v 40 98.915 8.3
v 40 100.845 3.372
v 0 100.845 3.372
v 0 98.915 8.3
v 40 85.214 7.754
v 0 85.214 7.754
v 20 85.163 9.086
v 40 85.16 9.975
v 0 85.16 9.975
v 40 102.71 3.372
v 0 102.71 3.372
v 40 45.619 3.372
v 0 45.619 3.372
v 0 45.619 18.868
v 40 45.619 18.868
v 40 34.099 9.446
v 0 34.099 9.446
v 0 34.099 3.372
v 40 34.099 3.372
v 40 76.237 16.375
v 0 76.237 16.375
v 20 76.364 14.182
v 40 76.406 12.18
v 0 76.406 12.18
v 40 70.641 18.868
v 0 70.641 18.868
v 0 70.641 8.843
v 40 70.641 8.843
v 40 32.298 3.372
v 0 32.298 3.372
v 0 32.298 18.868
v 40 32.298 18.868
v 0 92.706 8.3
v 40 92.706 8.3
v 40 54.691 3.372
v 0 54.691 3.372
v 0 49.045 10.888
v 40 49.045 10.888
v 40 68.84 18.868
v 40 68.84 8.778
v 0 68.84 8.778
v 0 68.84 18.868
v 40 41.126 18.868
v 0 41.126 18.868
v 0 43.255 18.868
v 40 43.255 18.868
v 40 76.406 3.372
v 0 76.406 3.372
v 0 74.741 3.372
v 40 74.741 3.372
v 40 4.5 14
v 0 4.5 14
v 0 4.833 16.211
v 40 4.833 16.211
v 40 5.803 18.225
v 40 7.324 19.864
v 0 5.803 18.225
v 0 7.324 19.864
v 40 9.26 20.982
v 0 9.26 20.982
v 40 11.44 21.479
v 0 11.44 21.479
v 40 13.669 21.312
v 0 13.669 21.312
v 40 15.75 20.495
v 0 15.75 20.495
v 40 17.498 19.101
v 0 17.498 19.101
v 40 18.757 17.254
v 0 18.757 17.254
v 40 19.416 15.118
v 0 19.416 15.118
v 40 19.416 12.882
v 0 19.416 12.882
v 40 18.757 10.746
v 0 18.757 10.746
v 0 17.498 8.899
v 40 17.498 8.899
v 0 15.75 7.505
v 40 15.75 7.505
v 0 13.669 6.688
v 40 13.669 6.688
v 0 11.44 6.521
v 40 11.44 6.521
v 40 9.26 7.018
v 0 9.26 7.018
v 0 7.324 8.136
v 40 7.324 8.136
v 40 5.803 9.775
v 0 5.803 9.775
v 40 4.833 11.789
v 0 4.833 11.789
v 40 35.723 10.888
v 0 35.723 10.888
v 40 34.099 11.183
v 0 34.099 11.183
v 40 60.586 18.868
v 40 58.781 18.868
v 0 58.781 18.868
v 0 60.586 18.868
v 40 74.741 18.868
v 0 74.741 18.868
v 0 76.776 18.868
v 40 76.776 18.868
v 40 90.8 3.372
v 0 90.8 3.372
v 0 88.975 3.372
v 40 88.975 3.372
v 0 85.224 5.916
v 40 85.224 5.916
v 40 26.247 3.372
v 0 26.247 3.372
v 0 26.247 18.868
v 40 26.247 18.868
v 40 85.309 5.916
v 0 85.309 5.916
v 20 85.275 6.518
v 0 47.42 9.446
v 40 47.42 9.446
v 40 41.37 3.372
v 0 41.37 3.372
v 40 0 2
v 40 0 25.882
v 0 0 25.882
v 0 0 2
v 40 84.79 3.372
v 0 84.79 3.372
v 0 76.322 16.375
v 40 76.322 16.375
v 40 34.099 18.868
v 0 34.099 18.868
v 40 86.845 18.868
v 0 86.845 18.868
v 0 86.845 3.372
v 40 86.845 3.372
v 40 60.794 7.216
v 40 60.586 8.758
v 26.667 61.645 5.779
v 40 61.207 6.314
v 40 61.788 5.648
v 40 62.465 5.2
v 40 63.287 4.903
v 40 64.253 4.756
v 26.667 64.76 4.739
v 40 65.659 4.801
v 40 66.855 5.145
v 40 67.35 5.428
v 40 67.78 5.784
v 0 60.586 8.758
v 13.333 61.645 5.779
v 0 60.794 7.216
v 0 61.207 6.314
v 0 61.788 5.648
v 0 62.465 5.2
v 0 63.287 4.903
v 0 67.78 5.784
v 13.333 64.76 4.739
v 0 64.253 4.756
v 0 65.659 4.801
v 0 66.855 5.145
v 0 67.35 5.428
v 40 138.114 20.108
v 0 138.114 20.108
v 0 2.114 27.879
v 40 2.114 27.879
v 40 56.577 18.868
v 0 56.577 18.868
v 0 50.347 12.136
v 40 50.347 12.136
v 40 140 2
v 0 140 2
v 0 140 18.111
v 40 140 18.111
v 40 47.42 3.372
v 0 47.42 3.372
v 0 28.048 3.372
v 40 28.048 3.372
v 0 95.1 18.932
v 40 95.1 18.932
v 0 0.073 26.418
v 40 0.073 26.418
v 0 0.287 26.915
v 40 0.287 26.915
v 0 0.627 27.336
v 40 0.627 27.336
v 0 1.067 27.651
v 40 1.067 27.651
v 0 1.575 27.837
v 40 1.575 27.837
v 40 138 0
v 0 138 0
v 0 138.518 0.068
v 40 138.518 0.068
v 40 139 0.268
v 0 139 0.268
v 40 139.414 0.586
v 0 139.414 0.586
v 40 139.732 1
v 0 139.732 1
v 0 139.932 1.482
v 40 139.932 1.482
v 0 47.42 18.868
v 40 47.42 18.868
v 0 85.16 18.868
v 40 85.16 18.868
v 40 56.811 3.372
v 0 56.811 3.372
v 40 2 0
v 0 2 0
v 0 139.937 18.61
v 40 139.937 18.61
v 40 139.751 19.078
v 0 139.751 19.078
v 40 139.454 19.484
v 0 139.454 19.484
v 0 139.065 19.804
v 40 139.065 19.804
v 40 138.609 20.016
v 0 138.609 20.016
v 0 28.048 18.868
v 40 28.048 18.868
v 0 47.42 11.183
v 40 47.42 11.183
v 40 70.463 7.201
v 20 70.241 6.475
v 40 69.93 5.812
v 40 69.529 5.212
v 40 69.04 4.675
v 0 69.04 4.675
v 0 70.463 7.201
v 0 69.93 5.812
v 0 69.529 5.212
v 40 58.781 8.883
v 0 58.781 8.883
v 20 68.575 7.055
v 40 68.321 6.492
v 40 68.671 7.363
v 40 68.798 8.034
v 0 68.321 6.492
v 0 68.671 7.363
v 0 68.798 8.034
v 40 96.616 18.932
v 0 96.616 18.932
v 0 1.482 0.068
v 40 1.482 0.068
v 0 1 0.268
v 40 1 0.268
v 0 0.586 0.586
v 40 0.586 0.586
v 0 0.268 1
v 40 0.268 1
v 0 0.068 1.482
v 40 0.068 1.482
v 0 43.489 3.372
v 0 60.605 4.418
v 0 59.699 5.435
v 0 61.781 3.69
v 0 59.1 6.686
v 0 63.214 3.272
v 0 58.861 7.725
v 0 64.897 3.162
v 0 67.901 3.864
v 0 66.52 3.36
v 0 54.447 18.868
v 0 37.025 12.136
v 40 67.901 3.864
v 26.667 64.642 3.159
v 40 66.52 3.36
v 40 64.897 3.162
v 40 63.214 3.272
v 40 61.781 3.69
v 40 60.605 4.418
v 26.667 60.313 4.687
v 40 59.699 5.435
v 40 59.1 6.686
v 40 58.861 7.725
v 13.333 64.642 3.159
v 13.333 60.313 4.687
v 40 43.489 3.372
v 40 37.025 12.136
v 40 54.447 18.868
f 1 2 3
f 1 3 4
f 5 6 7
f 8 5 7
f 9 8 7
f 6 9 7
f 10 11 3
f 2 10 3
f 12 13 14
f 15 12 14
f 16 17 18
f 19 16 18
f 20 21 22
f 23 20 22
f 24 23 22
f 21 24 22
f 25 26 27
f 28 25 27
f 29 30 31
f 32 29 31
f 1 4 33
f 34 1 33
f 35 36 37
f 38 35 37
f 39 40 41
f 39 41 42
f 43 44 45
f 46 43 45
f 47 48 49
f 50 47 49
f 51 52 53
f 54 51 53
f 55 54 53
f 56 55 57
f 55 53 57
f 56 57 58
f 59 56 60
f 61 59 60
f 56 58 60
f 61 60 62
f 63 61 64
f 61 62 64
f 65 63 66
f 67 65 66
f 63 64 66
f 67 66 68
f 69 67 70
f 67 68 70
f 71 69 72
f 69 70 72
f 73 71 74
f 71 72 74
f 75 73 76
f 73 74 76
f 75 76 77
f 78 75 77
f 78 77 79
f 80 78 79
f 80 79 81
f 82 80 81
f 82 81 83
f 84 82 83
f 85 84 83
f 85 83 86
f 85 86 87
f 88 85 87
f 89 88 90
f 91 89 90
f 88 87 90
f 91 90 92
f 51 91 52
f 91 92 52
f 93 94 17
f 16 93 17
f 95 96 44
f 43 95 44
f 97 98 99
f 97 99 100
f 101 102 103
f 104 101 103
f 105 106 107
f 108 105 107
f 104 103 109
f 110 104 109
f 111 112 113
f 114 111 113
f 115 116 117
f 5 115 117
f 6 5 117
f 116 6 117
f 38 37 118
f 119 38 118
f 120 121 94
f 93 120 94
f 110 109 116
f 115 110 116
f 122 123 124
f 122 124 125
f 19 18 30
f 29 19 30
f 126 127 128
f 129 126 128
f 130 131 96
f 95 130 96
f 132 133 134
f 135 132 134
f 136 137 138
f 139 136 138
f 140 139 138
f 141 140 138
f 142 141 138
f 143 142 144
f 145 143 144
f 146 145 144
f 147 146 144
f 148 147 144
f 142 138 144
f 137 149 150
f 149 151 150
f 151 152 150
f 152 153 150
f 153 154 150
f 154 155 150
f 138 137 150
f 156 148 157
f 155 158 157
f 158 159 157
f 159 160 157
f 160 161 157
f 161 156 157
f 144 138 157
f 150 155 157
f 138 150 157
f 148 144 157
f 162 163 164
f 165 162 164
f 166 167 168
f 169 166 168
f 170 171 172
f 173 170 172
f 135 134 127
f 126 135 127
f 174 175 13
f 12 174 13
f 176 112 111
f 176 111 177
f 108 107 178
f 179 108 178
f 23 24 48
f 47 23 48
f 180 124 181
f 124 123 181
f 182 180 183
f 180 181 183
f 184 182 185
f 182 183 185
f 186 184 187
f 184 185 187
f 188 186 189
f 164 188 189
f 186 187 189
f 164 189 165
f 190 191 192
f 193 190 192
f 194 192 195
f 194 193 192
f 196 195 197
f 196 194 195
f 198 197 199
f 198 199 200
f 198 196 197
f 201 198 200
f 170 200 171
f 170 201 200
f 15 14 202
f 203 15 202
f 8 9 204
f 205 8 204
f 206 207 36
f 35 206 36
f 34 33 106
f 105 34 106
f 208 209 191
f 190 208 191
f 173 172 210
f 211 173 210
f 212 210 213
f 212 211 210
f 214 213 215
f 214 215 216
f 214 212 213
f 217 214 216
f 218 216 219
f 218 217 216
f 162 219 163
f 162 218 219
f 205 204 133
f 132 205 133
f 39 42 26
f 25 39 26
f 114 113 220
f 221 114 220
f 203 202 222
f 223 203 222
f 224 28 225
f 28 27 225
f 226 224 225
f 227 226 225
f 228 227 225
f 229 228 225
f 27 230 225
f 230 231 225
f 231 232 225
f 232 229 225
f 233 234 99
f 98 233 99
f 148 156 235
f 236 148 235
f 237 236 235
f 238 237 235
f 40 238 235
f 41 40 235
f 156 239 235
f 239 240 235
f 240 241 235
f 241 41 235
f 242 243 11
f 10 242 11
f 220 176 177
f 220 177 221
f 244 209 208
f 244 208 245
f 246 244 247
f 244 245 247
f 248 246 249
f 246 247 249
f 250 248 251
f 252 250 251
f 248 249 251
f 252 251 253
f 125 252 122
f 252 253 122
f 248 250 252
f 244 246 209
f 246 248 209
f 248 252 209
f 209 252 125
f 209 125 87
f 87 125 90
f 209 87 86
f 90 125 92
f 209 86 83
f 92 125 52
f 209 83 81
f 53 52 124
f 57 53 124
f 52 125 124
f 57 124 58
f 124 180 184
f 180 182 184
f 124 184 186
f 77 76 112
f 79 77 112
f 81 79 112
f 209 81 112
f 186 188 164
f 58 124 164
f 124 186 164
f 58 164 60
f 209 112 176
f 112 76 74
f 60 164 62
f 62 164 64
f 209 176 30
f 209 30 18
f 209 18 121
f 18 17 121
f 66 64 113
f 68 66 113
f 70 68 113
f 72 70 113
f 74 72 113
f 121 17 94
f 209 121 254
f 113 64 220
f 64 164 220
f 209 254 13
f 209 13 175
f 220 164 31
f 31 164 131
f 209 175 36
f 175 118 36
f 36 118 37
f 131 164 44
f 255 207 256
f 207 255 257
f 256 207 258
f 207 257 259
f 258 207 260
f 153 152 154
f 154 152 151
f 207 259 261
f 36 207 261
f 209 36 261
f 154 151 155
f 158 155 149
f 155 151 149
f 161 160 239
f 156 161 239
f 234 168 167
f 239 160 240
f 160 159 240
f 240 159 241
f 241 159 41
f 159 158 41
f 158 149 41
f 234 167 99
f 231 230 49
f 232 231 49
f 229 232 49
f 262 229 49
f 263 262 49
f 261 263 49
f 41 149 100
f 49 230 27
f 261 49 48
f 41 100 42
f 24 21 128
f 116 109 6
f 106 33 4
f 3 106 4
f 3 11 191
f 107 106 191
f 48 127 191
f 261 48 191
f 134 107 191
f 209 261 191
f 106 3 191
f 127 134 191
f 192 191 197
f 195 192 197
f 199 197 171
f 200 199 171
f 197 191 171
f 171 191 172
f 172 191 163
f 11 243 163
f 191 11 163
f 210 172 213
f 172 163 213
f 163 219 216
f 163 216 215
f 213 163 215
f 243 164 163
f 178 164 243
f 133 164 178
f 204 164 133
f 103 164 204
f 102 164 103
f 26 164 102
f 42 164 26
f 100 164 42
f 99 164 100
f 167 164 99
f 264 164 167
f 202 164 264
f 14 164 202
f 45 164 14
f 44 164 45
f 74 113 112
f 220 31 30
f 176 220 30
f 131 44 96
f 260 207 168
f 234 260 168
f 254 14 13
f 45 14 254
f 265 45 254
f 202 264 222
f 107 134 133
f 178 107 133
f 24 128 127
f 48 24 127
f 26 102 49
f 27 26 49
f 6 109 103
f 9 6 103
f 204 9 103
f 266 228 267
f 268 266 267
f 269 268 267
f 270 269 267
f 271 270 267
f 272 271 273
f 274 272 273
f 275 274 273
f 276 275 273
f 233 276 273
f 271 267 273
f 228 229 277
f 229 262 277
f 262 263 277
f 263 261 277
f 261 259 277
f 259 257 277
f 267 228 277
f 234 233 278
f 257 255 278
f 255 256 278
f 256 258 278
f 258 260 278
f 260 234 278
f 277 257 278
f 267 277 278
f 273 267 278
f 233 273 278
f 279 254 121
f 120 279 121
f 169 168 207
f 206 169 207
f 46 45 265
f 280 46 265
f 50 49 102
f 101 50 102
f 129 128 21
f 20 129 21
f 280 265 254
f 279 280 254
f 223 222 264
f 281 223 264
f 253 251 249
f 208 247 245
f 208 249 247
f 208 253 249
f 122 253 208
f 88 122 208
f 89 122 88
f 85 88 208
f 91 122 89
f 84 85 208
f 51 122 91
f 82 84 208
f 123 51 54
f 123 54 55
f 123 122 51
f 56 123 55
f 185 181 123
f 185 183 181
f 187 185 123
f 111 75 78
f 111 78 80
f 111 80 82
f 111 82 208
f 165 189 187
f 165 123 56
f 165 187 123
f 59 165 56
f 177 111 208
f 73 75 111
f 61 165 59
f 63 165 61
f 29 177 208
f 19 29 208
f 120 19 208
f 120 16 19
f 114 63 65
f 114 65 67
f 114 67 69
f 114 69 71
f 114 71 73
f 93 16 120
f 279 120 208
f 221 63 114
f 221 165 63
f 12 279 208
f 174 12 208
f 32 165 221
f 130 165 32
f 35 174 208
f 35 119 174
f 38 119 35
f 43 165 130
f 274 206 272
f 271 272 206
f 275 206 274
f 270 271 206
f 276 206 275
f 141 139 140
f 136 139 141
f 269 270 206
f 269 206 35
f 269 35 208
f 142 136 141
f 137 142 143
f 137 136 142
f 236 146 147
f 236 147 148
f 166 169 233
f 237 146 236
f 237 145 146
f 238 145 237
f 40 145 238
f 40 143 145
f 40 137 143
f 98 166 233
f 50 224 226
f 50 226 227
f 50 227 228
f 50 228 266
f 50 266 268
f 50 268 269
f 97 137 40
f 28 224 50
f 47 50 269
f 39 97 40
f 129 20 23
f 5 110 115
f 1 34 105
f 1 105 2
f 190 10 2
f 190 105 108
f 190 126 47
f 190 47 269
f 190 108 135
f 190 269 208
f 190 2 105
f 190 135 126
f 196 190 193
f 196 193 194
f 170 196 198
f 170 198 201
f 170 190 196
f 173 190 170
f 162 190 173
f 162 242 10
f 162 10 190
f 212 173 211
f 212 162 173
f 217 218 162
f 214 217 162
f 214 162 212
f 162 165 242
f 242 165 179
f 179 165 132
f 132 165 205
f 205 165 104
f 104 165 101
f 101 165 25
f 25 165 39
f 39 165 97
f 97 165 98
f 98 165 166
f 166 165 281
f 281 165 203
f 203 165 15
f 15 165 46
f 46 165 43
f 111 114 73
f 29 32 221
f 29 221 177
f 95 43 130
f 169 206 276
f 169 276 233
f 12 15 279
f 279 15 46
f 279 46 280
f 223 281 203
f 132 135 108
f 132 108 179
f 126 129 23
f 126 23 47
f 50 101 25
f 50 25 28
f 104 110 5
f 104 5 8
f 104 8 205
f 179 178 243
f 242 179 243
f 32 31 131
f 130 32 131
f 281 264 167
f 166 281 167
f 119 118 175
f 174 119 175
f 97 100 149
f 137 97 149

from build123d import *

# Parameters (mm, degrees)
F0_W     = 1.8008393743
F0_H     = 15.4953580059
F1_DEPTH = 40
F2_R     = 2


with BuildPart() as f1:
    # F0 (on Right) → F1 (new body)
    with BuildSketch(Plane.YZ):
        Polygon((0, 14), (0, 0), (140, 0), (140, 20), (0, 28), align=None)
        with Locations((27.1479118072, 11.1200559583)):
            Rectangle(F0_W, F0_H, mode=Mode.SUBTRACT)
        Polygon((37.0253970758, 12.135783628), (43.4894269202, 3.3723769554), (41.3697948883, 3.3723769554), (35.7230951554, 10.8877442876), (34.0986091661, 9.4463945059), (34.0986091661, 3.3723769554), (32.2977697919, 3.3723769554), (32.2977697919, 18.8677349612), (34.0986091661, 18.8677349612), (34.0986091661, 11.1827970664), (41.1256132782, 18.8677349612), (43.2554195439, 18.8677349612), align=None, mode=Mode.SUBTRACT)
        Polygon((50.3468604697, 12.135783628), (56.8108903141, 3.3723769554), (54.6912582823, 3.3723769554), (49.0445585493, 10.8877442876), (47.4200725601, 9.4463945059), (47.4200725601, 3.3723769554), (45.6192331858, 3.3723769554), (45.6192331858, 18.8677349612), (47.4200725601, 18.8677349612), (47.4200725601, 11.1827970664), (54.4470766722, 18.8677349612), (56.5768829378, 18.8677349612), align=None, mode=Mode.SUBTRACT)
        with BuildLine():
            Line((68.8402260215, 18.8677349612), (70.6410653957, 18.8677349612))
            Line((70.6410653957, 18.8677349612), (70.6410653957, 8.8427233032))
            add(Edge.make_bspline(
                [(70.6410653957, 8.8427233032), (70.6410653957, 6.1906397049), (69.0403192853, 4.6746788757)],
                knots=[0, 0, 0, 1, 1, 1], degree=2))
            add(Edge.make_bspline(
                [(69.0403192853, 4.6746788757), (67.4395731748, 3.1587180465), (64.6416588927, 3.1587180465)],
                knots=[0, 0, 0, 1, 1, 1], degree=2))
            add(Edge.make_bspline(
                [(64.6416588927, 3.1587180465), (61.8437446106, 3.1587180465), (60.3125224308, 4.6865488151)],
                knots=[0, 0, 0, 1, 1, 1], degree=2))
            add(Edge.make_bspline(
                [(60.3125224308, 4.6865488151), (58.781300251, 6.2143795837), (58.781300251, 8.8834202382)],
                knots=[0, 0, 0, 1, 1, 1], degree=2))
            Line((58.781300251, 8.8834202382), (58.781300251, 18.8677349612))
            Line((58.781300251, 18.8677349612), (60.5855310365, 18.8677349612))
            Line((60.5855310365, 18.8677349612), (60.5855310365, 8.757938022))
            add(Edge.make_bspline(
                [(60.5855310365, 8.757938022), (60.5855310365, 6.8180507864), (61.6453470525, 5.7785832379)],
                knots=[0, 0, 0, 1, 1, 1], degree=2))
            add(Edge.make_bspline(
                [(61.6453470525, 5.7785832379), (62.7051630684, 4.7391156895), (64.7603582865, 4.7391156895)],
                knots=[0, 0, 0, 1, 1, 1], degree=2))
            add(Edge.make_bspline(
                [(64.7603582865, 4.7391156895), (66.7205939896, 4.7391156895), (67.7804100055, 5.7836703548)],
                knots=[0, 0, 0, 1, 1, 1], degree=2))
            add(Edge.make_bspline(
                [(67.7804100055, 5.7836703548), (68.8402260215, 6.8282250201), (68.8402260215, 8.7782864895)],
                knots=[0, 0, 0, 1, 1, 1], degree=2))
            Line((68.8402260215, 8.7782864895), (68.8402260215, 18.8677349612))
        make_face(mode=Mode.SUBTRACT)
        with BuildLine():
            Line((86.8452283531, 18.8677349612), (86.8452283531, 3.3723769554))
            Line((86.8452283531, 3.3723769554), (84.7900331349, 3.3723769554))
            Line((84.7900331349, 3.3723769554), (76.3216792412, 16.3750476917))
            Line((76.3216792412, 16.3750476917), (76.2368939599, 16.3750476917))
            add(Edge.make_bspline(
                [(76.2368939599, 16.3750476917), (76.4064645225, 14.0858450973), (76.4064645225, 12.1798719742)],
                knots=[0, 0, 0, 1, 1, 1], degree=2))
            Line((76.4064645225, 12.1798719742), (76.4064645225, 3.3723769554))
            Line((76.4064645225, 3.3723769554), (74.7412815982, 3.3723769554))
            Line((74.7412815982, 3.3723769554), (74.7412815982, 18.8677349612))
            Line((74.7412815982, 18.8677349612), (76.7761283488, 18.8677349612))
            Line((76.7761283488, 18.8677349612), (85.2241337751, 5.9159353936))
            Line((85.2241337751, 5.9159353936), (85.3089190564, 5.9159353936))
            add(Edge.make_bspline(
                [(85.3089190564, 5.9159353936), (85.2885705888, 6.2008139387), (85.2139595413, 7.7540802917)],
                knots=[0, 0, 0, 1, 1, 1], degree=2))
            add(Edge.make_bspline(
                [(85.2139595413, 7.7540802917), (85.1393484938, 9.3073466446), (85.1596969613, 9.9754546611)],
                knots=[0, 0, 0, 1, 1, 1], degree=2))
            Line((85.1596969613, 9.9754546611), (85.1596969613, 18.8677349612))
            Line((85.1596969613, 18.8677349612), (86.8452283531, 18.8677349612))
        make_face(mode=Mode.SUBTRACT)
        Polygon((102.7102501853, 3.3723769554), (100.8449739972, 3.3723769554), (98.9152609954, 8.3000975031), (92.7055869948, 8.3000975031), (90.7996138717, 3.3723769554), (88.9750346187, 3.3723769554), (95.099923338, 18.932171775), (96.6158841672, 18.932171775), align=None, mode=Mode.SUBTRACT)
        with BuildLine():
            ThreePointArc((19.5, 14), (12, 6.5), (4.5, 14))
            ThreePointArc((4.5, 14), (12, 21.5), (19.5, 14))
        make_face(mode=Mode.SUBTRACT)
    extrude(amount=F1_DEPTH)

    # F2
    f2_edges = [f1.edges().sort_by_distance(p)[0] for p in [
        (20, 140, 20),
        (20, 0, 28),
        (20, 0, 0),
        (20, 140, 0),
    ]]
    fillet(f2_edges, radius=F2_R)


solid = f1.part
